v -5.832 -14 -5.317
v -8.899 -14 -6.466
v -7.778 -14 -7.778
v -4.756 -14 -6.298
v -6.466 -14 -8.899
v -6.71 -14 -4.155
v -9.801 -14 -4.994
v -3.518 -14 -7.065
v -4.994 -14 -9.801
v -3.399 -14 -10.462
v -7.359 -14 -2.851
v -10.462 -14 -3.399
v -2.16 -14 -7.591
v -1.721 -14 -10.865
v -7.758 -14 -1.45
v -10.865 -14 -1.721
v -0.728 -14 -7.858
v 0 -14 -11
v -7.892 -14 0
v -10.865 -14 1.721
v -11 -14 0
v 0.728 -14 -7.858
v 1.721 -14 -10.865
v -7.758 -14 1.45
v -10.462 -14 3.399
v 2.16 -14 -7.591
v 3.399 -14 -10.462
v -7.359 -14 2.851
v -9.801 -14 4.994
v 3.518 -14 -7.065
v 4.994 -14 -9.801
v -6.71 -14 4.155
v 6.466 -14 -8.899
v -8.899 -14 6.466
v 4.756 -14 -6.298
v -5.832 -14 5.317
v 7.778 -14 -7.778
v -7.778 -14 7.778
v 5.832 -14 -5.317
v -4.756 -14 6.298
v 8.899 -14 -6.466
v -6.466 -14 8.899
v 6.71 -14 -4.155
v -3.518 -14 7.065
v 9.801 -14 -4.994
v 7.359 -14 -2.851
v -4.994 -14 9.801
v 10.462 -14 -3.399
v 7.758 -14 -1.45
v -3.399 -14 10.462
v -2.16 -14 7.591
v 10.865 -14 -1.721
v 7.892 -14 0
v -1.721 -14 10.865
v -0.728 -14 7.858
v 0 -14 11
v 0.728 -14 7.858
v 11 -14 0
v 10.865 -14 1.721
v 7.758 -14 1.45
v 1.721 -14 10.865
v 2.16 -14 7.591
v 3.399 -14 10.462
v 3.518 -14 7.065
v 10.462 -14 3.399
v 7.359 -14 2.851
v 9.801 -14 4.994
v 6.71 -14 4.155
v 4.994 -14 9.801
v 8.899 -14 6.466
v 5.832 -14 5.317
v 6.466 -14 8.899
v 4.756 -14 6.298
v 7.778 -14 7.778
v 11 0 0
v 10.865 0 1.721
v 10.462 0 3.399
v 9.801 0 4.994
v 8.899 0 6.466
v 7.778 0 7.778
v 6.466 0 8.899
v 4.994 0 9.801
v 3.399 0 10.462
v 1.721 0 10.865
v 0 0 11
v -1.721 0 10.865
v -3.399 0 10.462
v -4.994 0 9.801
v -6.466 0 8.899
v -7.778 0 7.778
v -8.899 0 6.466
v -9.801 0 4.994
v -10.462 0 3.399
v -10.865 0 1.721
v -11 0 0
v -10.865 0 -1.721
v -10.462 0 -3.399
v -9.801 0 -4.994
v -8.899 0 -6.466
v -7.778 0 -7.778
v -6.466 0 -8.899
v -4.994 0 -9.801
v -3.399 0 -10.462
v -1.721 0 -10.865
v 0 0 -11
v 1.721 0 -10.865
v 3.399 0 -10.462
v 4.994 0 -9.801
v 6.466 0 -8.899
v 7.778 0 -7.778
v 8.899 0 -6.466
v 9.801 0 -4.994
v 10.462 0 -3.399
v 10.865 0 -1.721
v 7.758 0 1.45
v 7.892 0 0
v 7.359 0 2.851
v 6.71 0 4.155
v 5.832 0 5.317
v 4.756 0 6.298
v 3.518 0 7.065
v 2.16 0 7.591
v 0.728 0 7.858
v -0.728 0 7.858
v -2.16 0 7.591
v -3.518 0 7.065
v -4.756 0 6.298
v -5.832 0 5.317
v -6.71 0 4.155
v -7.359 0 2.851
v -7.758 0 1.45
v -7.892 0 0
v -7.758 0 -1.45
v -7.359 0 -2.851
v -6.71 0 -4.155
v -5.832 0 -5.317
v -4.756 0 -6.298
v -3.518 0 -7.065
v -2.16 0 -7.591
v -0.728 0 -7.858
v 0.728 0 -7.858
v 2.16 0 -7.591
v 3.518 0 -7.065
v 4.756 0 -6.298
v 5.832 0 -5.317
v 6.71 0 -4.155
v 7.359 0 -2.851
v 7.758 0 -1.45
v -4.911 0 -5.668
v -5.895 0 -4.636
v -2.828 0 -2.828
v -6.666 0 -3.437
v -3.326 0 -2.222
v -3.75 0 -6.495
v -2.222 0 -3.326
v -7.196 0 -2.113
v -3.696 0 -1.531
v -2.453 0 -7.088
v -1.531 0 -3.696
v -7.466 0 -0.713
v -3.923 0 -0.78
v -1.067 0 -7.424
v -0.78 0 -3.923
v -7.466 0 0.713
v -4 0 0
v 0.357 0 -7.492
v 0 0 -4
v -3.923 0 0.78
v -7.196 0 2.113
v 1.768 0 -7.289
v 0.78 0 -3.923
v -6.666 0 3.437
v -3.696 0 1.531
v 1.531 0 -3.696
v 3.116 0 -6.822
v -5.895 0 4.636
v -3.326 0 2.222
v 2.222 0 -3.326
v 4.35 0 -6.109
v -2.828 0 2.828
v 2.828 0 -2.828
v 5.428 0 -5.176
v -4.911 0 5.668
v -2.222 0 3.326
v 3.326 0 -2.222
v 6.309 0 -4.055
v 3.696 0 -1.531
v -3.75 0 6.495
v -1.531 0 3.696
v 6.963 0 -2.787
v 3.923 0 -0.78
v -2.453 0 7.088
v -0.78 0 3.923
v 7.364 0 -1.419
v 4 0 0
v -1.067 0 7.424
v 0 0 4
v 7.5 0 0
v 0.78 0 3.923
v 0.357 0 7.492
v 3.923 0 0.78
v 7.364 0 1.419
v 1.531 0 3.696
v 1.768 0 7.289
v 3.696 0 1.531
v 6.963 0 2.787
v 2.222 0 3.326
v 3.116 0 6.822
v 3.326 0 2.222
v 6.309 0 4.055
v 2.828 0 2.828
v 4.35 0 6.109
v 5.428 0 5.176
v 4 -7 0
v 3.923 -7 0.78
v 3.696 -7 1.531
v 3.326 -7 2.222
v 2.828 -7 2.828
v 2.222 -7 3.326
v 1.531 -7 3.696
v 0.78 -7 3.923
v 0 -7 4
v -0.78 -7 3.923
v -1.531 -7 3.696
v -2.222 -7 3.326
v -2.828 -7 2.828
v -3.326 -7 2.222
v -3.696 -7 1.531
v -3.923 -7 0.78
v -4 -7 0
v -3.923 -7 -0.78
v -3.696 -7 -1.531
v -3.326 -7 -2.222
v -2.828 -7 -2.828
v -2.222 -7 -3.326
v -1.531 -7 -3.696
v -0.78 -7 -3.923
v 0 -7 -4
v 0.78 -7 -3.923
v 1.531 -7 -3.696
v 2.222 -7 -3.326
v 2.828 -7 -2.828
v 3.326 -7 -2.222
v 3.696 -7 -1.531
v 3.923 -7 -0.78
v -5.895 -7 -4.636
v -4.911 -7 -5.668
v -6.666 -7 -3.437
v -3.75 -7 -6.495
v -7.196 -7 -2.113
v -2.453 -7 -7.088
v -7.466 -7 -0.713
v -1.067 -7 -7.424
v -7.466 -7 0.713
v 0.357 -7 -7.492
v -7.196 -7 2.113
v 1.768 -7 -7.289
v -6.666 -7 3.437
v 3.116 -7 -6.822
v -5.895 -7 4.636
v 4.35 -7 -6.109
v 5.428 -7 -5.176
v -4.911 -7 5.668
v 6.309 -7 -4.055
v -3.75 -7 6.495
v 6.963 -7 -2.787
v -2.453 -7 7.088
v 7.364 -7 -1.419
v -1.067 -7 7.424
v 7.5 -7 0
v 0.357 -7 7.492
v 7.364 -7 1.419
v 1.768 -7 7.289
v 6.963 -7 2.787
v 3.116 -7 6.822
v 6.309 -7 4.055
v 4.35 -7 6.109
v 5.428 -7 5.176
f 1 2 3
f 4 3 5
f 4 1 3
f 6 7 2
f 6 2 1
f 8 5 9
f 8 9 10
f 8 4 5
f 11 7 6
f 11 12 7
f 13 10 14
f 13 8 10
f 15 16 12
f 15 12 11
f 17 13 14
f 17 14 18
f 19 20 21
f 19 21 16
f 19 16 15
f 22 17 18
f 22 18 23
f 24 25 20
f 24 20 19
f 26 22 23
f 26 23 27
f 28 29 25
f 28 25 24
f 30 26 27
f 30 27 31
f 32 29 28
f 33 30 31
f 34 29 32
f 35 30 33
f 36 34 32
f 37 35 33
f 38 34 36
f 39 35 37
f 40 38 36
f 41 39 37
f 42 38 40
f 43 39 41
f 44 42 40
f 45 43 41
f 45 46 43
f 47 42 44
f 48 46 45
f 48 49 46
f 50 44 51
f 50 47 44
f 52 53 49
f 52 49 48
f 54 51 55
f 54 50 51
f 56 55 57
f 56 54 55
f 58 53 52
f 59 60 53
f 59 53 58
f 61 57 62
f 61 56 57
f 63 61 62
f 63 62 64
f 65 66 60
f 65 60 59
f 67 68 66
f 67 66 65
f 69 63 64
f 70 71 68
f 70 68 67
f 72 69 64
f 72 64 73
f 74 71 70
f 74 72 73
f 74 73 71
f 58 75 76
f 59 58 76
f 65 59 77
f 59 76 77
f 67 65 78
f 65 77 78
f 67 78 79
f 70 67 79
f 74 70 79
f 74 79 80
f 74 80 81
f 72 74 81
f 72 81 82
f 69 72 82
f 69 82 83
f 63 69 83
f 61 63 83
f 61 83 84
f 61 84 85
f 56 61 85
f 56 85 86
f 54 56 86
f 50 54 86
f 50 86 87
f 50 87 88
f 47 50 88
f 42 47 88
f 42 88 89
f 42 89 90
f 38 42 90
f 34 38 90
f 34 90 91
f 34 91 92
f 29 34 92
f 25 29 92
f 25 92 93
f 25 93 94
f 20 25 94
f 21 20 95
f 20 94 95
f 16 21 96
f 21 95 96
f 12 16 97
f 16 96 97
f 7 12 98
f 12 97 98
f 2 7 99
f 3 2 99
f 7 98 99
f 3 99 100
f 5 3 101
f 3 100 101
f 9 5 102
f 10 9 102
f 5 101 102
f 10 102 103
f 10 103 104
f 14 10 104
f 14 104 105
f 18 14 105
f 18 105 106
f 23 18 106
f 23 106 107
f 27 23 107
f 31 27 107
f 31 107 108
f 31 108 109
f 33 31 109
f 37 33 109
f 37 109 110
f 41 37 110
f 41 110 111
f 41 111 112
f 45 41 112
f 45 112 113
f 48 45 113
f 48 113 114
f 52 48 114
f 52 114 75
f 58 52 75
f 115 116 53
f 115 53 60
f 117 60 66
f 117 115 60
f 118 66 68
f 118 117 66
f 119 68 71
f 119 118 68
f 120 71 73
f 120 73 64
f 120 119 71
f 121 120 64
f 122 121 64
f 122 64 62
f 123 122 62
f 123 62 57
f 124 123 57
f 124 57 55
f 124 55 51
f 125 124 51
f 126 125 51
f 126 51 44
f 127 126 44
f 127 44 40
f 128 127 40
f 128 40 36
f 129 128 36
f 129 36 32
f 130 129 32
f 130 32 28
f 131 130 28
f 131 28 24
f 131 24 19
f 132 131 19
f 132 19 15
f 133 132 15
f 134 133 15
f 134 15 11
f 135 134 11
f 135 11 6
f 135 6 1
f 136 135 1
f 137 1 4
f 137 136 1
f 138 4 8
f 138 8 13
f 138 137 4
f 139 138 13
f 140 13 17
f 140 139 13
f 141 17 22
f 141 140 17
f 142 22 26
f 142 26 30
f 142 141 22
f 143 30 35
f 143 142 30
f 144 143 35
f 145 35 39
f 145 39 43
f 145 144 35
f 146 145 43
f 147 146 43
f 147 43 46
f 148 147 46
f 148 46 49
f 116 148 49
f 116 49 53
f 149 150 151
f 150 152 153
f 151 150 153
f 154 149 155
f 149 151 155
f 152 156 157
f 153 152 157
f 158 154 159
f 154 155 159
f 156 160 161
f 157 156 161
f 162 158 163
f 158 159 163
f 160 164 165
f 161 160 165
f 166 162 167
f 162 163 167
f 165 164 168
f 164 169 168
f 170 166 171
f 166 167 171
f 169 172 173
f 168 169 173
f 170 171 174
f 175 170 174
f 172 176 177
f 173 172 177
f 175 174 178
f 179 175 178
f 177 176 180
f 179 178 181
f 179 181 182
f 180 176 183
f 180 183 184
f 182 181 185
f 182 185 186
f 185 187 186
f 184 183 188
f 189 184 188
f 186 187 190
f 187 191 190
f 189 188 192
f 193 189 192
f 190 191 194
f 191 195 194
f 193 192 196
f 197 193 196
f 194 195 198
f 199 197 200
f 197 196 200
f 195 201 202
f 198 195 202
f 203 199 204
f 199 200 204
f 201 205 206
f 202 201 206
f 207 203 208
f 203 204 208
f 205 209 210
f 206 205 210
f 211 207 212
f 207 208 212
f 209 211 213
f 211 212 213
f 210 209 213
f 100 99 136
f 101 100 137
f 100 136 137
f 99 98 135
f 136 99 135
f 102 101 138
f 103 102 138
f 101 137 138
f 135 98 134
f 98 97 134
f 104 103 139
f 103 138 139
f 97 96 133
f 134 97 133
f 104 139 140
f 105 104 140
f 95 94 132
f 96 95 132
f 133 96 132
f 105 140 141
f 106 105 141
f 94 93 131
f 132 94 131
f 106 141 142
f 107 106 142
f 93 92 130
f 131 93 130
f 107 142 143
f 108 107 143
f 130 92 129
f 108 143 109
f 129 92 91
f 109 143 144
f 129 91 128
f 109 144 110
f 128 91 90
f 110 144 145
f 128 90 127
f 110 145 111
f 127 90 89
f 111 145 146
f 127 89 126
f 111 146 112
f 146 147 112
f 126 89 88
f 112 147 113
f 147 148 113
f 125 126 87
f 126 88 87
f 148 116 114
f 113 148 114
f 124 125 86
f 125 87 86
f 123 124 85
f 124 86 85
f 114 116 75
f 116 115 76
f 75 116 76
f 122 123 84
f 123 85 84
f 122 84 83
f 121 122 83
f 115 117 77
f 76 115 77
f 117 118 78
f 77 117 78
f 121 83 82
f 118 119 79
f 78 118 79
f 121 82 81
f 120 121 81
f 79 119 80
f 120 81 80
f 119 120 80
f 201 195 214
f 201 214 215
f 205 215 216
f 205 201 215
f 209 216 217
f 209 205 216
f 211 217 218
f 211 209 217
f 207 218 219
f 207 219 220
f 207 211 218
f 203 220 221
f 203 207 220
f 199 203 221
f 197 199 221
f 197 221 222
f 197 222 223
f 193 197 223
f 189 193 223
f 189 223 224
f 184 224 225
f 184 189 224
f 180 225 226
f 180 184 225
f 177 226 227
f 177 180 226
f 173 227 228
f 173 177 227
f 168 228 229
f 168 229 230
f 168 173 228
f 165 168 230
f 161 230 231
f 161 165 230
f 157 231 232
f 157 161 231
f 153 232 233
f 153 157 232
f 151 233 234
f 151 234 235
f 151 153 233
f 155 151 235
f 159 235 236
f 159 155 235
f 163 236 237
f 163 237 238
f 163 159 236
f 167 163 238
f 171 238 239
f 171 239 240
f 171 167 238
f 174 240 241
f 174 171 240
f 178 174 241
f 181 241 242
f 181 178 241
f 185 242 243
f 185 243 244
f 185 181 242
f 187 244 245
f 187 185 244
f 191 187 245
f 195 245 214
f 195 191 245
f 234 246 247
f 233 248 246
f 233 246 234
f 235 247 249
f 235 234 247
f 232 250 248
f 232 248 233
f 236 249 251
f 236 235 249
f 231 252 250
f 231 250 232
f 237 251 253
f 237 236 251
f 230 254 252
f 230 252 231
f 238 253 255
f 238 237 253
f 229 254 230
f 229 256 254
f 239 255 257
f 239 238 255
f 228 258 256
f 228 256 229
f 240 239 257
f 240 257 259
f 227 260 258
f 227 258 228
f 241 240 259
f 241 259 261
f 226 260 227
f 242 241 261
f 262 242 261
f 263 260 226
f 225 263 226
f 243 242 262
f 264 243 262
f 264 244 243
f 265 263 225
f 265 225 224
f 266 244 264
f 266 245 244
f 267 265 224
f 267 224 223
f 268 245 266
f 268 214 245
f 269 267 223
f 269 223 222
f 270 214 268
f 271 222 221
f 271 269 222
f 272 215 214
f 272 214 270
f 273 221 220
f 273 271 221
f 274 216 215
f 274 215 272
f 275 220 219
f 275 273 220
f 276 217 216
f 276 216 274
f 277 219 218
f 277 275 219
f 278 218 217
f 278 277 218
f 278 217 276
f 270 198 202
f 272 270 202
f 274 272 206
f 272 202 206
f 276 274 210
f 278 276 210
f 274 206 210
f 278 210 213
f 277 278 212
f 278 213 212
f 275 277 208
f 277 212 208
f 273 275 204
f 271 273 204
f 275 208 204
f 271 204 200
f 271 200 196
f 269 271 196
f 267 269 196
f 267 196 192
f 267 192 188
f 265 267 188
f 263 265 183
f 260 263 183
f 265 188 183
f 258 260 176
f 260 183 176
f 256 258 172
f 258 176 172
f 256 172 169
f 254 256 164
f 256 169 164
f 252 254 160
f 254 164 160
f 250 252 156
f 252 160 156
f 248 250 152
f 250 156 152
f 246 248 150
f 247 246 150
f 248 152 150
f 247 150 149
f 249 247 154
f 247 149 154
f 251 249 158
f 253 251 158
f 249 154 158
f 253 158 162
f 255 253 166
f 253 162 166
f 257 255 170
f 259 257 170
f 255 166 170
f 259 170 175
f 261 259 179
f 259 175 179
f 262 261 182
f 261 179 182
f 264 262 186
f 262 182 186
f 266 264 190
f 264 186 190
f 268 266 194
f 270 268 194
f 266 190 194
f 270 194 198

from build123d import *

# Parameters (mm, degrees)
F0_R        = 7.5
F0_R_2      = 4
F1_DEPTH    = 7
F2_R        = 11
F2_R_2      = 7.891923
F3_DEPTH    = 7
F3_FACE_R   = 11
F3_FACE_R_2 = 7.891923
F4_DEPTH    = 7


with BuildPart() as f1:
    # F0 (on Front) → F1 (new body)
    with BuildSketch(Plane.XZ):
        Circle(F0_R)
        Circle(F0_R_2, mode=Mode.SUBTRACT)
    extrude(amount=F1_DEPTH)


with BuildPart() as f3:
    # F2 (on Front) → F3 (new body)
    with BuildSketch(Plane.XZ):
        Circle(F2_R)
        Circle(F2_R_2, mode=Mode.SUBTRACT)
    extrude(amount=F3_DEPTH)

    # F2 (on Front) + F3_face (on face) → F4 (join)
    with BuildSketch(Plane.XZ):
        Circle(F2_R)
        Circle(F2_R_2, mode=Mode.SUBTRACT)
    with BuildSketch(Plane.XZ.offset(7)):
        Circle(F3_FACE_R)
        Circle(F3_FACE_R_2, mode=Mode.SUBTRACT)
    extrude(amount=F4_DEPTH)


solid = Compound([f1.part, f3.part])
